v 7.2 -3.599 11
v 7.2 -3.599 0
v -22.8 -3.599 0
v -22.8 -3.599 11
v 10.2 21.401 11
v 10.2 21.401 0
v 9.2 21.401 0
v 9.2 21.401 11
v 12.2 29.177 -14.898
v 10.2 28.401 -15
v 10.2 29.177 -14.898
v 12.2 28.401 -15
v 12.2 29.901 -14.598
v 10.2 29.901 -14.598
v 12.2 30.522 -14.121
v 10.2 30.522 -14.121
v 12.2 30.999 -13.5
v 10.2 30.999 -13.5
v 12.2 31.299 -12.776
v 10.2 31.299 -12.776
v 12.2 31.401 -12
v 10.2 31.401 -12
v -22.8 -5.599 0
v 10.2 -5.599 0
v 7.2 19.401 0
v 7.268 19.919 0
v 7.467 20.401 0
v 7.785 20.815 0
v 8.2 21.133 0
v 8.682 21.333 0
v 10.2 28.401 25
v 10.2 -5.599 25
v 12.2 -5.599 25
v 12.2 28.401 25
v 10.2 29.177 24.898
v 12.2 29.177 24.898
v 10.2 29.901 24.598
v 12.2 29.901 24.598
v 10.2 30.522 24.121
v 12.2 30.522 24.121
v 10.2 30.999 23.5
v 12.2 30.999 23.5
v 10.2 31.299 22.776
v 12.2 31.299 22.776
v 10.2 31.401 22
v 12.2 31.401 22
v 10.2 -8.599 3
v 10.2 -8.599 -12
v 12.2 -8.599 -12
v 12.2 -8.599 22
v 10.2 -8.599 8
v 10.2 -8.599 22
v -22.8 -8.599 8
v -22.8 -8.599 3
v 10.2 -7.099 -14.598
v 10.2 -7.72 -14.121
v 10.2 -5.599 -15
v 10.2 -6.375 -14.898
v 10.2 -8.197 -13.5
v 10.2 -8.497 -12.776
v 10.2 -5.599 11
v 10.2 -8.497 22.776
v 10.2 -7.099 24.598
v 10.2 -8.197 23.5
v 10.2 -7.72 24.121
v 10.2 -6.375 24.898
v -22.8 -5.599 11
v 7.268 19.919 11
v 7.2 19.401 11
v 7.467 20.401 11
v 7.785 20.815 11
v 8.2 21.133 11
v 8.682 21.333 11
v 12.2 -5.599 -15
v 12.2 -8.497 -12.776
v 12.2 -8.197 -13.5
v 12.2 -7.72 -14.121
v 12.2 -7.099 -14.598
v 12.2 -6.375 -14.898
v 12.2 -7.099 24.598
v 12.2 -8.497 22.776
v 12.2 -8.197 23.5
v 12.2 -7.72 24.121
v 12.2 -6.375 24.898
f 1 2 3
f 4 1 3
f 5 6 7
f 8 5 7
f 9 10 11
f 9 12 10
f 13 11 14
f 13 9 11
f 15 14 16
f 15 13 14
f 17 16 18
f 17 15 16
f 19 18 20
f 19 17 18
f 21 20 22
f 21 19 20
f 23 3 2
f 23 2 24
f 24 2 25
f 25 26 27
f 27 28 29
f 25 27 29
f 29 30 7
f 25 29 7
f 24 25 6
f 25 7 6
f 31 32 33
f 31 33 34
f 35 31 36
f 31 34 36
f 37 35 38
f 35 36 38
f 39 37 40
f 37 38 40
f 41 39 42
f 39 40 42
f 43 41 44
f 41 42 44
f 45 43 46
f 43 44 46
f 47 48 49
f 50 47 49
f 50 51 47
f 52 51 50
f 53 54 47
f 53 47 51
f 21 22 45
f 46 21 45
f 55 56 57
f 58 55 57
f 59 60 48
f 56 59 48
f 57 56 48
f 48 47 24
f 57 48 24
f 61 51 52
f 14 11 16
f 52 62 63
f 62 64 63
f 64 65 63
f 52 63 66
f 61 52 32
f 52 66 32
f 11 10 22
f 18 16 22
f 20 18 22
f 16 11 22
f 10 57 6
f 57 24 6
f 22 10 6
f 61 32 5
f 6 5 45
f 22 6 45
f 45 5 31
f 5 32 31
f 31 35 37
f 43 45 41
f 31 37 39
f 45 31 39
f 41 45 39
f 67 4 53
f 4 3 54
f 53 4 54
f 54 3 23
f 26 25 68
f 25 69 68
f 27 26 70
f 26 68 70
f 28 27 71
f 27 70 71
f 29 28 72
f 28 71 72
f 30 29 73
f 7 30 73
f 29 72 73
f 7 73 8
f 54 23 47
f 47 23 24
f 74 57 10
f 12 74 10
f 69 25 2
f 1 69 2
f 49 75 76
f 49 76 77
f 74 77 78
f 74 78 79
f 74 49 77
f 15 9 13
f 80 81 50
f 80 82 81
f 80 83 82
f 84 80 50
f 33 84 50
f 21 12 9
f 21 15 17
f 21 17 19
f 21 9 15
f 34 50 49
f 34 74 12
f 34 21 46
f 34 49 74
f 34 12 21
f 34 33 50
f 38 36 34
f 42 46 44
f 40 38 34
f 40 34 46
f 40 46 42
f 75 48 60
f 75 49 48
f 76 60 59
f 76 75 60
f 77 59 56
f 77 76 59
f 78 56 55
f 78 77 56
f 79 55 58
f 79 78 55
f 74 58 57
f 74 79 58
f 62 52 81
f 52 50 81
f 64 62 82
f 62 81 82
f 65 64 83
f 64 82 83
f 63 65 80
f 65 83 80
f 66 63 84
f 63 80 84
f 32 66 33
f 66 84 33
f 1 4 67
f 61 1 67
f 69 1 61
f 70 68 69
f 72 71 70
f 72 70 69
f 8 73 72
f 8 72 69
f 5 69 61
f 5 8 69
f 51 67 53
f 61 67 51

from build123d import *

# Parameters (mm, degrees)
PAD_DEPTH    = 11
CHAMFER_SIZE = 3
FILLET_R     = 2
SKETCH001_W  = 39.802324
SKETCH001_H  = 56.00523
POCKET_DEPTH = 50
SKETCH002_W  = 40
SKETCH002_H  = 40
PAD001_DEPTH = 2
FILLET001_R  = 3


with BuildPart() as part:
    # Sketch → Pad (new body)
    with BuildSketch(Plane.XY):
        Polygon((-22.800474, -3.599016), (-22.800474, -8.599016), (10.199526, -8.599016), (10.199526, 18.400984), (28.199526, 18.400984), (28.199526, -8.599016), (31.199526, -8.599016), (31.199526, 21.400984), (7.199526, 21.400984), (7.199526, -3.599016), align=None)
    extrude(amount=PAD_DEPTH)

    # Chamfer
    chamfer_edges = [part.edges().sort_by_distance(p)[0] for p in [
        (-6.300474, -8.599016, 0),
        (-6.300474, -8.599016, 11),
    ]]
    chamfer(chamfer_edges, length=CHAMFER_SIZE)

    # Fillet
    fillet_edges = [part.edges().sort_by_distance(p)[0] for p in [
        (31.199526, 21.400984, 5.5),
        (7.199526, 21.400984, 5.5),
    ]]
    fillet(fillet_edges, radius=FILLET_R)

    # Sketch001 (on Face14 of Fillet) → Pocket (cut)
    with BuildSketch(Plane.XY.offset(11)):
        with Locations((30.100688, 5.3986)):
            Rectangle(SKETCH001_W, SKETCH001_H)
    extrude(amount=-POCKET_DEPTH, mode=Mode.SUBTRACT)

    # Sketch002 (on Face5 of Pocket) → Pad001 (join)
    with BuildSketch(Plane.YZ.offset(10.199526)):
        with Locations((11.400984, 5)):
            Rectangle(SKETCH002_W, SKETCH002_H)
    extrude(amount=PAD001_DEPTH)

    # Fillet001
    fillet001_edges = [part.edges().sort_by_distance(p)[0] for p in [
        (11.199526, 31.400984, 25),
        (11.199526, 31.400984, -15),
        (11.199526, -8.599016, -15),
        (11.199526, -8.599016, 25),
    ]]
    fillet(fillet001_edges, radius=FILLET001_R)


solid = part.part
